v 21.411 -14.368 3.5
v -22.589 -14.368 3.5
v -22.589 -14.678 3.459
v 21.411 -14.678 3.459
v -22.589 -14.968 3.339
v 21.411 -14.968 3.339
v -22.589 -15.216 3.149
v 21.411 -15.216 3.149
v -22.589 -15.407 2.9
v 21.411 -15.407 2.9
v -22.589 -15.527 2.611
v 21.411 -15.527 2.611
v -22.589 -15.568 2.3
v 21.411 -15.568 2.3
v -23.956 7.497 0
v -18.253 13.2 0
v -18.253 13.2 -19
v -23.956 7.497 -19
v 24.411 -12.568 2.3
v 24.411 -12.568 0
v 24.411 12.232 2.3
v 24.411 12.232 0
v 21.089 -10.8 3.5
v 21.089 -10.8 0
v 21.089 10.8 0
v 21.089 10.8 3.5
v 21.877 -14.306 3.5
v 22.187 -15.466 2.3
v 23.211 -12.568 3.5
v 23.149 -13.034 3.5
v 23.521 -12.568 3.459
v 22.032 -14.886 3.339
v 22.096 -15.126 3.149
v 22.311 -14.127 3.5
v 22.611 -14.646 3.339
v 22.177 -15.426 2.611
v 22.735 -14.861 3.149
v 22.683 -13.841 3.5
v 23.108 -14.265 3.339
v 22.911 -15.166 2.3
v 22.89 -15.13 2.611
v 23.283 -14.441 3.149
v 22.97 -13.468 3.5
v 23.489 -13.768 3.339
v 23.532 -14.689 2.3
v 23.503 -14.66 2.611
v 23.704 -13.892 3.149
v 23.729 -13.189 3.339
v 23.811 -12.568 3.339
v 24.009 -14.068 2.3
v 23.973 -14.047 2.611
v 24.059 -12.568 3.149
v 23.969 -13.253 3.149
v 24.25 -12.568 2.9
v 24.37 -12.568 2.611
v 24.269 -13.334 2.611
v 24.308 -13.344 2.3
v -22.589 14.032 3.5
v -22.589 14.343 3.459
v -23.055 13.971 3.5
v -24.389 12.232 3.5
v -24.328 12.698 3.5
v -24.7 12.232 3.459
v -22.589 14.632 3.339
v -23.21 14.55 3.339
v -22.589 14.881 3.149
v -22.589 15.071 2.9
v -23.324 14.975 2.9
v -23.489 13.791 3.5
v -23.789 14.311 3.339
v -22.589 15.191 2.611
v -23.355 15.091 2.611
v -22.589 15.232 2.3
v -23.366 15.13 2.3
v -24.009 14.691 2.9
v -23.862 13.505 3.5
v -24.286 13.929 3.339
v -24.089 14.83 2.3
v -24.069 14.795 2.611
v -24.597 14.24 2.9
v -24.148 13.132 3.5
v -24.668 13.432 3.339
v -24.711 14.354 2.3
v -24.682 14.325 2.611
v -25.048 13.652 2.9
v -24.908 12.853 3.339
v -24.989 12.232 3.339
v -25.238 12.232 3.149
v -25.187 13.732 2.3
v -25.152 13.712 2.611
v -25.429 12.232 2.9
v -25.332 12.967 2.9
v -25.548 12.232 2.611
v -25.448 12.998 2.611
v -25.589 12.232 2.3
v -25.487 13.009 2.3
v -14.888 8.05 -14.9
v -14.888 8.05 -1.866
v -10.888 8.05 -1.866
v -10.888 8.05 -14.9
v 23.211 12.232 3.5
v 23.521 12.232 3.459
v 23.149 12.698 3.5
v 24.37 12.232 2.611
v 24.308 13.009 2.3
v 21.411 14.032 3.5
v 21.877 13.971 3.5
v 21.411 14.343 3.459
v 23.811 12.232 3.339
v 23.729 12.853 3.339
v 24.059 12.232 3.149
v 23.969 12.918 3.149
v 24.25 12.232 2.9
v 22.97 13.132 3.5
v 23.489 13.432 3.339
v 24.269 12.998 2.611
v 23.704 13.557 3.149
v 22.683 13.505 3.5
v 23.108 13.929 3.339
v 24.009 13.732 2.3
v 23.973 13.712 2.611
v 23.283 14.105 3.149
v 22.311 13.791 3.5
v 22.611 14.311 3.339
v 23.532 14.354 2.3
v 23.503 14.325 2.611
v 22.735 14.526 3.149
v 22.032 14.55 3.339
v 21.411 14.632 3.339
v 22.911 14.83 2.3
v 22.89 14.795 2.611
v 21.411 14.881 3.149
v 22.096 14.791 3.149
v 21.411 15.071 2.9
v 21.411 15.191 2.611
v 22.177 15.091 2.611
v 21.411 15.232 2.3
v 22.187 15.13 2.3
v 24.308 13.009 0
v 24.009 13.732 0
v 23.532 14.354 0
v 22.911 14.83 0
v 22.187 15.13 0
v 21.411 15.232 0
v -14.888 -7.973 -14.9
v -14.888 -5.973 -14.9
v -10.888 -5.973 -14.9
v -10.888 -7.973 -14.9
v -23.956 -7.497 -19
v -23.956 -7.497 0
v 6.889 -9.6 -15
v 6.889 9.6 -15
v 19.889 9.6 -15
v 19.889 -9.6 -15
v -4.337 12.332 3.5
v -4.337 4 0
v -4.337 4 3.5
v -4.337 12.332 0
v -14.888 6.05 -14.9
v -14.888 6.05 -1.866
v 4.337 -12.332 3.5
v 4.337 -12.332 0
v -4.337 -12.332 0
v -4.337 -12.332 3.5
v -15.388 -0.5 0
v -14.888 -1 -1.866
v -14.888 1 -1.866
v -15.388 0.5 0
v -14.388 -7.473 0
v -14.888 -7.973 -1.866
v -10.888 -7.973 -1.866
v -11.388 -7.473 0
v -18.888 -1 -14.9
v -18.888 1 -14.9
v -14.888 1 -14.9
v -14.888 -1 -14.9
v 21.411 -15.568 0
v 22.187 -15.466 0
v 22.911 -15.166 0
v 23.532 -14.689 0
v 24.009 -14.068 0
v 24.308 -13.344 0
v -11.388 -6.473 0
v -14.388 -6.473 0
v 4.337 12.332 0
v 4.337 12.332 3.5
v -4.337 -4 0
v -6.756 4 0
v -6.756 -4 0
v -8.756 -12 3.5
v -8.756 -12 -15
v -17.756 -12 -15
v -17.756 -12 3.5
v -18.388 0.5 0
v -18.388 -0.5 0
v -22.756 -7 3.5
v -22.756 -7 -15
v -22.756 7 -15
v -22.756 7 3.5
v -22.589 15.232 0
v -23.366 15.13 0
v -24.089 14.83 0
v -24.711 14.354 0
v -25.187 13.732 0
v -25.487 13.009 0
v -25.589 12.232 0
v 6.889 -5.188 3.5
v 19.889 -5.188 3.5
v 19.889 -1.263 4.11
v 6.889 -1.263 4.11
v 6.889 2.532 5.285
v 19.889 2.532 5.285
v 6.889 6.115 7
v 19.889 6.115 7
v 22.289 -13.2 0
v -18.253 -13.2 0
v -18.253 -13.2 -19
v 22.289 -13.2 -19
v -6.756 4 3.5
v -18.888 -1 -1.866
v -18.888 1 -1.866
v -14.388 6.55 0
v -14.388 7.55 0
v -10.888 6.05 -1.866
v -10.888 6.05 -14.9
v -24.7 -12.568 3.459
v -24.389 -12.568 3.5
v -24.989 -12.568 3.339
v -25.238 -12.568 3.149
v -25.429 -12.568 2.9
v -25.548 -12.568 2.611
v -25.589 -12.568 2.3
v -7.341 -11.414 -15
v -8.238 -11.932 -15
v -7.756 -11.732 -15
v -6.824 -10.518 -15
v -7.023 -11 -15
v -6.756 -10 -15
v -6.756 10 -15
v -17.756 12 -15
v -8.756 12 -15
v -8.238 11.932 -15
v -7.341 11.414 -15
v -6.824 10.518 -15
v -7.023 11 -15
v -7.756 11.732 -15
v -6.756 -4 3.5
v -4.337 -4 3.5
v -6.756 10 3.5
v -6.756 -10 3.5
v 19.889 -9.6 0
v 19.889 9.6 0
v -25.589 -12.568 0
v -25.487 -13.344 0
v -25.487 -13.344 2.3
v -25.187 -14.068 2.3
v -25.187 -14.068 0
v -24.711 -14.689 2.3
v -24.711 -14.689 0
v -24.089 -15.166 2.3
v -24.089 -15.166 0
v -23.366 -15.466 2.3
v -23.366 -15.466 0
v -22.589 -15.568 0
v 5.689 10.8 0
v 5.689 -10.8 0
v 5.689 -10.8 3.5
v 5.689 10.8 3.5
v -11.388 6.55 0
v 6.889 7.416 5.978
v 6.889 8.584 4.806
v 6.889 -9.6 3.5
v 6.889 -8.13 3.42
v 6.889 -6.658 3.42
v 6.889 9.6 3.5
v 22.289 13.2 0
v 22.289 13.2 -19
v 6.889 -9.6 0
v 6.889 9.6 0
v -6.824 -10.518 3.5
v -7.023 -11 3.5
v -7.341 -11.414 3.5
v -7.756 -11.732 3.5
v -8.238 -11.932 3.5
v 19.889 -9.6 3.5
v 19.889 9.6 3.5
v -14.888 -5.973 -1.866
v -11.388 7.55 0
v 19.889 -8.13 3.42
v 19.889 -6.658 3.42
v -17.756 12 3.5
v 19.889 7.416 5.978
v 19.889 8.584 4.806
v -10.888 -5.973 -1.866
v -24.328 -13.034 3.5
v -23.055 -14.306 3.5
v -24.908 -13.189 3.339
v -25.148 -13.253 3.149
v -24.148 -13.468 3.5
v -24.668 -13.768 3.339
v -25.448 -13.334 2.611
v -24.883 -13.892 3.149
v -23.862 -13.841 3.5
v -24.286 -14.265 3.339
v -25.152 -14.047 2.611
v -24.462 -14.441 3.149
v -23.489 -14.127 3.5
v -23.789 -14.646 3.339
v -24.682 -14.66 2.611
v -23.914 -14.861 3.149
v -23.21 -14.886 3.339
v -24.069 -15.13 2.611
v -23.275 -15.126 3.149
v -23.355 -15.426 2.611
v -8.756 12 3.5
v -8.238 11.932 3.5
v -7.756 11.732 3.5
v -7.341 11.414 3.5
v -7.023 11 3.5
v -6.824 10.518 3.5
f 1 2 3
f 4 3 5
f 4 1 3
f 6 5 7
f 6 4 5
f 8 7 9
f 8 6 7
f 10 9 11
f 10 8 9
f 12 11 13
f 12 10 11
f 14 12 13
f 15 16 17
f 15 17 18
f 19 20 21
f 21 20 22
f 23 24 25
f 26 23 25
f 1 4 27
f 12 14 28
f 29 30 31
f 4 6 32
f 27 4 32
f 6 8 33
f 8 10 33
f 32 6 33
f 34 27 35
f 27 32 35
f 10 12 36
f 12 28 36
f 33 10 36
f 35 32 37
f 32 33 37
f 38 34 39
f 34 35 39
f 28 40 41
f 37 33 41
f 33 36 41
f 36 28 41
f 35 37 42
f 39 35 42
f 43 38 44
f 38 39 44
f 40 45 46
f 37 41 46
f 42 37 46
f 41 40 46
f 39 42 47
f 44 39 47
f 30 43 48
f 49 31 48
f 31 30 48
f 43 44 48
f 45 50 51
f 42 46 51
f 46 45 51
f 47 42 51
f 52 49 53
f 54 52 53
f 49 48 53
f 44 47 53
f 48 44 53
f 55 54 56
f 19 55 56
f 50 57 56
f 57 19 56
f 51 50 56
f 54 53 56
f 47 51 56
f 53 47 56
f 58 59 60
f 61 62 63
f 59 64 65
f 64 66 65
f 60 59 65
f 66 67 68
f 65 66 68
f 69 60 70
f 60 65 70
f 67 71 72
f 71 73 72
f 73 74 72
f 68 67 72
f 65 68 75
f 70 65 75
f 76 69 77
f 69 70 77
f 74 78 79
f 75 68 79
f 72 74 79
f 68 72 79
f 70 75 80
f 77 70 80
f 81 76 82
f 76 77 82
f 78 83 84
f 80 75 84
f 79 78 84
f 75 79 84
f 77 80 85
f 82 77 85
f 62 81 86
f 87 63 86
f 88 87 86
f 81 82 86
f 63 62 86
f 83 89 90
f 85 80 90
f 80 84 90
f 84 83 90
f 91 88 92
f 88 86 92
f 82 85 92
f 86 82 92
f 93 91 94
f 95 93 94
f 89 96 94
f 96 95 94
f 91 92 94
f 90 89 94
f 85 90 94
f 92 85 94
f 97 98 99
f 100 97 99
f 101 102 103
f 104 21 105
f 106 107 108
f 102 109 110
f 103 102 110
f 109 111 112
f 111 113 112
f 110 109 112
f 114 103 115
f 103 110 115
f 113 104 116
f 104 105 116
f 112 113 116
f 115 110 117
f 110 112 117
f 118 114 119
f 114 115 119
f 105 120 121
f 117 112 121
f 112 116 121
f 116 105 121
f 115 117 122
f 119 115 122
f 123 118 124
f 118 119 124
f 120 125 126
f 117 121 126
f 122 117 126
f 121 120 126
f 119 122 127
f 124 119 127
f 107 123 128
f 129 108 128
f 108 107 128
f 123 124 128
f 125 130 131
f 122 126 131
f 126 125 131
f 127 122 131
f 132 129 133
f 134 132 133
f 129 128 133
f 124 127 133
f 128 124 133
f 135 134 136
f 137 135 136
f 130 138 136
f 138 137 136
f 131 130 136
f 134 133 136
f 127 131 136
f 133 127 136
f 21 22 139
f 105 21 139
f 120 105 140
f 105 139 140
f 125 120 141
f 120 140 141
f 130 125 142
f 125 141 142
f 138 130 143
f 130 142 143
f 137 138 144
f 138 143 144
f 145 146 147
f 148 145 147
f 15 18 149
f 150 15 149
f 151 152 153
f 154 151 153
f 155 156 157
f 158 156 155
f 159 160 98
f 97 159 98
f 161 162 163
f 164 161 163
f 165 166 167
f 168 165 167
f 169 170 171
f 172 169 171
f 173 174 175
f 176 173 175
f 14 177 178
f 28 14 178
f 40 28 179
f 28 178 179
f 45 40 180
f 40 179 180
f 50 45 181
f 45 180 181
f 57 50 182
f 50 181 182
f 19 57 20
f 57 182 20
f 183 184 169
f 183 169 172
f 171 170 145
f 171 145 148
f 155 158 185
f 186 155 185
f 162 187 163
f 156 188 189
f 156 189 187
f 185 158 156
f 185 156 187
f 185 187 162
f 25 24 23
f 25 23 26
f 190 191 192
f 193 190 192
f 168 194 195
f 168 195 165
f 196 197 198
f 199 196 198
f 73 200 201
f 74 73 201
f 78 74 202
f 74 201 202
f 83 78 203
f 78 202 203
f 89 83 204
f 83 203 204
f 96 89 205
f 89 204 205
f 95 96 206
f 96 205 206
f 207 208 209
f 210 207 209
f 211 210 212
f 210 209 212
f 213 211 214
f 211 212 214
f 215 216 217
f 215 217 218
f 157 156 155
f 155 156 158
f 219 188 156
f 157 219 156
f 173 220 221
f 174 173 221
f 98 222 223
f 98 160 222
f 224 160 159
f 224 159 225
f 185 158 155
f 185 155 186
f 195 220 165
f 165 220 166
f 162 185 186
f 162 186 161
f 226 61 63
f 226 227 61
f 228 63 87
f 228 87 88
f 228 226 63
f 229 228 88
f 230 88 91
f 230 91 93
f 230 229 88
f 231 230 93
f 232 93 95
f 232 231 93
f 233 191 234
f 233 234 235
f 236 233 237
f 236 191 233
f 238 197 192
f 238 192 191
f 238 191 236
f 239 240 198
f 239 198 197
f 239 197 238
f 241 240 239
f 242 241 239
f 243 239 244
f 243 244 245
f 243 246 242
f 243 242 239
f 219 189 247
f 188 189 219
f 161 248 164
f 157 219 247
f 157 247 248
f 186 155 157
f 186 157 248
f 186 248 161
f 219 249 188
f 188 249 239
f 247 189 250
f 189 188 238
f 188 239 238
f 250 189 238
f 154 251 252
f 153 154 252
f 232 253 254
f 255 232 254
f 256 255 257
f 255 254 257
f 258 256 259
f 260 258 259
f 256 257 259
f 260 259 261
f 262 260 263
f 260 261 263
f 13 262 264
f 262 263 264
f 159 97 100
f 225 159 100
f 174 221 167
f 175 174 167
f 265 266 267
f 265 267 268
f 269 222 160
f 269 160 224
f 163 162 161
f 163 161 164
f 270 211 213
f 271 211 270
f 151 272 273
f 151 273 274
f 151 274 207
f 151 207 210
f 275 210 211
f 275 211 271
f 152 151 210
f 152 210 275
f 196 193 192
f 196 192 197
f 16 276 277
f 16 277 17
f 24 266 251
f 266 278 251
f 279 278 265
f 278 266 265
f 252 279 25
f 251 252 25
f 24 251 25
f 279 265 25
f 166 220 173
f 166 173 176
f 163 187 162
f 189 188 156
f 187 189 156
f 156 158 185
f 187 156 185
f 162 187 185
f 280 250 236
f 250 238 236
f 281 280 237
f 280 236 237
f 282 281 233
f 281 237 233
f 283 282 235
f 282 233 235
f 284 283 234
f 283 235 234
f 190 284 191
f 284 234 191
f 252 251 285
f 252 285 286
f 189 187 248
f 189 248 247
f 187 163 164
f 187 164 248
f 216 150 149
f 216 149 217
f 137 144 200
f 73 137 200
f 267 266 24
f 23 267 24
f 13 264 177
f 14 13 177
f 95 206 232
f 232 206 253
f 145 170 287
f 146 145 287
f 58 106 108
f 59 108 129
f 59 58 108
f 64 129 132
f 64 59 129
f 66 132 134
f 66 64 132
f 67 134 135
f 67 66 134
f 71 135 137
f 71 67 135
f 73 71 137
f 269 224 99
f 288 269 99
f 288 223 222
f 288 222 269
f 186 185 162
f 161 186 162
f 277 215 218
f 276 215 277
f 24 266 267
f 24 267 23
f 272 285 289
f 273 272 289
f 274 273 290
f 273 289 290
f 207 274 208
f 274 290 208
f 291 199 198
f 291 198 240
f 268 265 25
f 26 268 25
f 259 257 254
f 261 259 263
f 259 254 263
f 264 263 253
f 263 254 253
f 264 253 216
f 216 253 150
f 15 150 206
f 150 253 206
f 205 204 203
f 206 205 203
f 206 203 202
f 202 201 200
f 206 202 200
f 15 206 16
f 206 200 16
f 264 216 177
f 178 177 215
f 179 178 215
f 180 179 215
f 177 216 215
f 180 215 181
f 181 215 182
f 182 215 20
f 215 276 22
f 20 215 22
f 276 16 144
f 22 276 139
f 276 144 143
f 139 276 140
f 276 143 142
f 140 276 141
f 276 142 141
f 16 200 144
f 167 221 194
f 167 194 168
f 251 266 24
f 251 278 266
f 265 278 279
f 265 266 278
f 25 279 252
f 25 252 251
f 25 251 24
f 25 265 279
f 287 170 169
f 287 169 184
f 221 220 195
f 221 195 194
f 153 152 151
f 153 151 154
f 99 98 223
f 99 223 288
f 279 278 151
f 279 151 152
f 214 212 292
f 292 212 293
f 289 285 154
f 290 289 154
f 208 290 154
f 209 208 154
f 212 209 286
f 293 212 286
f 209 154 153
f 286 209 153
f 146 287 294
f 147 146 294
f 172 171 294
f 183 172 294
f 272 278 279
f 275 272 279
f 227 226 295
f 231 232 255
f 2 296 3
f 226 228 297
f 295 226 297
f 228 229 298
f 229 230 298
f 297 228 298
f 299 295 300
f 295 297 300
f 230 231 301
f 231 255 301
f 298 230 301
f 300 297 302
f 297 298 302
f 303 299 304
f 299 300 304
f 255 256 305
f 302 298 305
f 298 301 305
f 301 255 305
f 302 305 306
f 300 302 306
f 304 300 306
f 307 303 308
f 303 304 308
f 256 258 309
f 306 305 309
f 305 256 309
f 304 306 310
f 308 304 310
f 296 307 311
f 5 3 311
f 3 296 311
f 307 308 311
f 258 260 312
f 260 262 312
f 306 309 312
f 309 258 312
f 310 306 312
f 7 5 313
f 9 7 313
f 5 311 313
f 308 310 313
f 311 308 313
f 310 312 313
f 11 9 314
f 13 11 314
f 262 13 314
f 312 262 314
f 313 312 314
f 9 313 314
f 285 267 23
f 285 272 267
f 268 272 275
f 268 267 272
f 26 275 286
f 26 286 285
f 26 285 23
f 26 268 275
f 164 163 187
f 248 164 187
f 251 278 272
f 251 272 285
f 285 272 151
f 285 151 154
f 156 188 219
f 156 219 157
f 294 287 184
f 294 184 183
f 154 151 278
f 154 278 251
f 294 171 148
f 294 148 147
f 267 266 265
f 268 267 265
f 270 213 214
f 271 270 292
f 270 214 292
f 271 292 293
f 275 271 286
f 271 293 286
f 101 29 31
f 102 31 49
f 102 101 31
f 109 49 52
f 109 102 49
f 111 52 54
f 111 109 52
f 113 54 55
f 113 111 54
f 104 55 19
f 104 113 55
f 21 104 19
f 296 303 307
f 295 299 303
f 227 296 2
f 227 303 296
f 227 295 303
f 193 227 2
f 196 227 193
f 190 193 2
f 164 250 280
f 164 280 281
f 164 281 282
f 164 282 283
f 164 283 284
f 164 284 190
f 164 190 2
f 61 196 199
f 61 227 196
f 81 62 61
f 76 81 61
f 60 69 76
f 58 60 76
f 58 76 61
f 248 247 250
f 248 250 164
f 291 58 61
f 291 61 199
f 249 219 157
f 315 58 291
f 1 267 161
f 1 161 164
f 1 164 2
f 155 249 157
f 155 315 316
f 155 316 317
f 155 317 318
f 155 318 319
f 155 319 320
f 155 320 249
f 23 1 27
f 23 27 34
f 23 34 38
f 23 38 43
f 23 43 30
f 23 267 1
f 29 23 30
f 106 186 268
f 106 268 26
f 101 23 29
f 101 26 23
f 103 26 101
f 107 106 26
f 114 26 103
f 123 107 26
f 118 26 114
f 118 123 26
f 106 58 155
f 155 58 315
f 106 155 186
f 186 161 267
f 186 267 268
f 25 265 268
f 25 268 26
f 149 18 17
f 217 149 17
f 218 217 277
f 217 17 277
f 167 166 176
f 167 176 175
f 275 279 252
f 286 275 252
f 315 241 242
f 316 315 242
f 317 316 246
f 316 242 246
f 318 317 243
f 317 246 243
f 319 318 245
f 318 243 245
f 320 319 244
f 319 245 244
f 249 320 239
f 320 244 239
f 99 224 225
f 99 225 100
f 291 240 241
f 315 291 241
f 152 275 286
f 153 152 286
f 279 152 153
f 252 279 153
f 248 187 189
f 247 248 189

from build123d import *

# Parameters (mm, degrees)
F0_W        = 15.4
F0_H        = 21.6
F1_DEPTH    = 3.5
F0_W_2      = 4
F0_H_2      = 2
F0_W_3      = 13
F0_H_3      = 19.2
F0_W_4      = 2.418700546
F0_H_4      = 8
F2_DEPTH    = 19
F3_DEPTH    = 15
F4_C1_SIZE2 = 0.5
F4_C1_SIZE  = 1.8660254038
F4_C2_SIZE2 = 0.5
F4_C2_SIZE  = 1.8660254038
F4_C3_SIZE2 = 1.8660254038
F4_C3_SIZE  = 0.5
F4_C4_SIZE2 = 1.8660254038
F4_C4_SIZE  = 0.5
F5_SIZE2    = 1.8660254038
F5_SIZE     = 0.5
F6_SIZE2    = 1.8660254038
F6_SIZE     = 0.5
F7_DEPTH    = 3.5
F8_DEPTH    = 22
F10_DEPTH   = 25
F11_R       = 1.2
F12_START   = -14.9
F12_DEPTH   = 0.1


with BuildPart() as f1:
    # F0 (on Top) → F1 (new body)
    with BuildSketch(Plane.XY):
        with BuildLine():
            Line((21.4106866419, 15.232257545), (-22.5893133581, 15.232257545))
            ThreePointArc((-22.5893133581, 15.232257545), (-24.7106337016, 14.3535778886), (-25.5893133581, 12.232257545))
            Line((-25.5893133581, 12.232257545), (-25.5893133581, -12.567742455))
            ThreePointArc((-25.5893133581, -12.567742455), (-24.7106337016, -14.6890627986), (-22.5893133581, -15.567742455))
            Line((-22.5893133581, -15.567742455), (21.4106866419, -15.567742455))
            ThreePointArc((21.4106866419, -15.567742455), (23.5320069855, -14.6890627986), (24.4106866419, -12.567742455))
            Line((24.4106866419, -12.567742455), (24.4106866419, 12.232257545))
            ThreePointArc((24.4106866419, 12.232257545), (23.5320069855, 14.3535778886), (21.4106866419, 15.232257545))
        make_face()
        Polygon((-18.2525572471, 13.2), (-8.7555009723, 13.2), (22.2888856925, 13.2), (22.2888856925, -13.2), (-8.7555009723, -13.2), (-18.2525572471, -13.2), (-23.9555009723, -7.4970562748), (-23.9555009723, 7.4970562748), align=None, mode=Mode.SUBTRACT)
        Polygon((22.2888856925, 13.2), (-8.7555009723, 13.2), (-18.2525572471, 13.2), (-23.9555009723, 7.4970562748), (-23.9555009723, -7.4970562748), (-18.2525572471, -13.2), (-8.7555009723, -13.2), (22.2888856925, -13.2), align=None)
        with BuildLine():
            Line((-4.3368004262, 4), (-4.3368004262, 12.3322419822))
            Line((-4.3368004262, 12.3322419822), (4.3368004262, 12.3322419822))
            Line((4.3368004262, 12.3322419822), (4.3368004262, -12.3322419822))
            Line((4.3368004262, -12.3322419822), (-4.3368004262, -12.3322419822))
            Line((-4.3368004262, -12.3322419822), (-4.3368004262, -4))
            Line((-4.3368004262, -4), (-6.7555009723, -4))
            Line((-6.7555009723, -4), (-6.7555009723, -10))
            ThreePointArc((-6.7555009723, -10), (-7.3412874099, -11.4142135624), (-8.7555009723, -12))
            Line((-8.7555009723, -12), (-17.7555009723, -12))
            Line((-17.7555009723, -12), (-22.7555009723, -7))
            Line((-22.7555009723, -7), (-22.7555009723, 7))
            Line((-22.7555009723, 7), (-17.7555009723, 12))
            Line((-17.7555009723, 12), (-8.7555009723, 12))
            ThreePointArc((-8.7555009723, 12), (-7.3412874099, 11.4142135624), (-6.7555009723, 10))
            Line((-6.7555009723, 10), (-6.7555009723, 4))
            Line((-6.7555009723, 4), (-4.3368004262, 4))
        make_face(mode=Mode.SUBTRACT)
        with Locations((13.3888856925, 0)):
            Rectangle(F0_W, F0_H, mode=Mode.SUBTRACT)
    extrude(amount=F1_DEPTH)

    # F0 (on Top) → F2 (join)
    with BuildSketch(Plane.XY):
        Polygon((22.2888856925, 13.2), (-8.7555009723, 13.2), (-18.2525572471, 13.2), (-23.9555009723, 7.4970562748), (-23.9555009723, -7.4970562748), (-18.2525572471, -13.2), (-8.7555009723, -13.2), (22.2888856925, -13.2), align=None)
        with BuildLine():
            Line((-4.3368004262, 4), (-4.3368004262, 12.3322419822))
            Line((-4.3368004262, 12.3322419822), (4.3368004262, 12.3322419822))
            Line((4.3368004262, 12.3322419822), (4.3368004262, -12.3322419822))
            Line((4.3368004262, -12.3322419822), (-4.3368004262, -12.3322419822))
            Line((-4.3368004262, -12.3322419822), (-4.3368004262, -4))
            Line((-4.3368004262, -4), (-6.7555009723, -4))
            Line((-6.7555009723, -4), (-6.7555009723, -10))
            ThreePointArc((-6.7555009723, -10), (-7.3412874099, -11.4142135624), (-8.7555009723, -12))
            Line((-8.7555009723, -12), (-17.7555009723, -12))
            Line((-17.7555009723, -12), (-22.7555009723, -7))
            Line((-22.7555009723, -7), (-22.7555009723, 7))
            Line((-22.7555009723, 7), (-17.7555009723, 12))
            Line((-17.7555009723, 12), (-8.7555009723, 12))
            ThreePointArc((-8.7555009723, 12), (-7.3412874099, 11.4142135624), (-6.7555009723, 10))
            Line((-6.7555009723, 10), (-6.7555009723, 4))
            Line((-6.7555009723, 4), (-4.3368004262, 4))
        make_face(mode=Mode.SUBTRACT)
        with Locations((13.3888856925, 0)):
            Rectangle(F0_W, F0_H, mode=Mode.SUBTRACT)
        with BuildLine():
            Line((-6.7555009723, -4), (-6.7555009723, 4))
            Line((-6.7555009723, 4), (-6.7555009723, 10))
            ThreePointArc((-6.7555009723, 10), (-7.3412874099, 11.4142135624), (-8.7555009723, 12))
            Line((-8.7555009723, 12), (-17.7555009723, 12))
            Line((-17.7555009723, 12), (-22.7555009723, 7))
            Line((-22.7555009723, 7), (-22.7555009723, -7))
            Line((-22.7555009723, -7), (-17.7555009723, -12))
            Line((-17.7555009723, -12), (-8.7555009723, -12))
            ThreePointArc((-8.7555009723, -12), (-7.3412874099, -11.4142135624), (-6.7555009723, -10))
            Line((-6.7555009723, -10), (-6.7555009723, -4))
        make_face()
        with Locations((-12.8875139207, -6.9733052514)):
            Rectangle(F0_W_2, F0_H_2, mode=Mode.SUBTRACT)
        with Locations((-16.8875139207, 0)):
            Rectangle(F0_W_2, F0_H_2, mode=Mode.SUBTRACT)
        with Locations((-12.8875139207, 7.0500936662)):
            Rectangle(F0_W_2, F0_H_2, mode=Mode.SUBTRACT)
        with Locations((13.3888856925, 0)):
            Rectangle(F0_W, F0_H)
        with Locations((13.3888856925, 0)):
            Rectangle(F0_W_3, F0_H_3, mode=Mode.SUBTRACT)
        with Locations((13.3888856925, 0)):
            Rectangle(F0_W_3, F0_H_3)
        Polygon((4.3368004262, 12.3322419822), (-4.3368004262, 12.3322419822), (-4.3368004262, 4), (-4.3368004262, -4), (-4.3368004262, -12.3322419822), (4.3368004262, -12.3322419822), align=None)
        with Locations((-5.5461506993, 0)):
            Rectangle(F0_W_4, F0_H_4)
        with Locations((-12.8875139207, -6.9733052514)):
            Rectangle(F0_W_2, F0_H_2)
        with Locations((-16.8875139207, 0)):
            Rectangle(F0_W_2, F0_H_2)
        with Locations((-12.8875139207, 7.0500936662)):
            Rectangle(F0_W_2, F0_H_2)
    extrude(amount=-F2_DEPTH)

    # F0 (on Top) → F3 (cut)
    with BuildSketch(Plane.XY):
        with BuildLine():
            Line((-6.7555009723, -4), (-6.7555009723, 4))
            Line((-6.7555009723, 4), (-6.7555009723, 10))
            ThreePointArc((-6.7555009723, 10), (-7.3412874099, 11.4142135624), (-8.7555009723, 12))
            Line((-8.7555009723, 12), (-17.7555009723, 12))
            Line((-17.7555009723, 12), (-22.7555009723, 7))
            Line((-22.7555009723, 7), (-22.7555009723, -7))
            Line((-22.7555009723, -7), (-17.7555009723, -12))
            Line((-17.7555009723, -12), (-8.7555009723, -12))
            ThreePointArc((-8.7555009723, -12), (-7.3412874099, -11.4142135624), (-6.7555009723, -10))
            Line((-6.7555009723, -10), (-6.7555009723, -4))
        make_face()
        with Locations((-12.8875139207, -6.9733052514)):
            Rectangle(F0_W_2, F0_H_2, mode=Mode.SUBTRACT)
        with Locations((-16.8875139207, 0)):
            Rectangle(F0_W_2, F0_H_2, mode=Mode.SUBTRACT)
        with Locations((-12.8875139207, 7.0500936662)):
            Rectangle(F0_W_2, F0_H_2, mode=Mode.SUBTRACT)
        with Locations((13.3888856925, 0)):
            Rectangle(F0_W_3, F0_H_3)
    extrude(amount=-F3_DEPTH, mode=Mode.SUBTRACT)

    # F4: chamfer of 0.5 x 1.8660254038 on 4 edges, made by hand

    # F4_c1
    f4_c1_edges = [f1.edges().sort_by_distance(p)[0] for p in [
        (-10.8875139207, 7.0500936662, 0),
    ]]
    f4_c1_side = f1.faces().sort_by_distance((-10.8875139207, 7.0500936662, -0.01))[0]
    chamfer(f4_c1_edges, length=F4_C1_SIZE, length2=F4_C1_SIZE2, reference=f4_c1_side)

    # F4_c2
    f4_c2_edges = [f1.edges().sort_by_distance(p)[0] for p in [
        (-13.1375139207, 6.0500936662, 0),
    ]]
    f4_c2_side = f1.faces().sort_by_distance((-13.1375139207, 6.0500936662, -0.01))[0]
    chamfer(f4_c2_edges, length=F4_C2_SIZE, length2=F4_C2_SIZE2, reference=f4_c2_side)

    # F4_c3
    f4_c3_edges = [f1.edges().sort_by_distance(p)[0] for p in [
        (-14.8875139207, 7.3000936662, 0),
    ]]
    f4_c3_side = f1.faces().sort_by_distance((-14.8775139207, 7.3000936662, 0))[0]
    chamfer(f4_c3_edges, length=F4_C3_SIZE, length2=F4_C3_SIZE2, reference=f4_c3_side)

    # F4_c4
    f4_c4_edges = [f1.edges().sort_by_distance(p)[0] for p in [
        (-12.8875139207, 8.0500936662, 0),
    ]]
    f4_c4_side = f1.faces().sort_by_distance((-12.8875139207, 8.0400936662, 0))[0]
    chamfer(f4_c4_edges, length=F4_C4_SIZE, length2=F4_C4_SIZE2, reference=f4_c4_side)

    # F5
    f5_edges = [f1.edges().sort_by_distance(p)[0] for p in [
        (-16.887514, 1, 0),
        (-14.887514, 0, 0),
        (-16.887514, -1, 0),
        (-18.887514, 0, 0),
    ]]
    f5_side = f1.faces().sort_by_distance((-16.887514, 0, 0))[0]
    chamfer(f5_edges, length=F5_SIZE, length2=F5_SIZE2, reference=f5_side)

    # F6
    f6_edges = [f1.edges().sort_by_distance(p)[0] for p in [
        (-14.887514, -6.973305, 0),
        (-12.887514, -5.973305, 0),
        (-10.887514, -6.973305, 0),
        (-12.887514, -7.973305, 0),
    ]]
    f6_side = f1.faces().sort_by_distance((-12.887514, -6.973305, 0))[0]
    chamfer(f6_edges, length=F6_SIZE, length2=F6_SIZE2, reference=f6_side)


with BuildPart() as f7:
    # F7 (new, through all): a face of the model
    f7_faces = [f1.part.faces().sort_by_distance(p)[0] for p in [
        (-0.4600310991, 0, 0),
    ]]
    extrude(f7_faces, amount=F7_DEPTH)


with BuildPart() as f7b:
    # F7#2 (new, through all): a face of the model
    f7_2_faces = [f1.part.faces().sort_by_distance(p)[0] for p in [
        (13.3888856925, -10.5347227865, 0),
    ]]
    extrude(f7_2_faces, amount=F7_DEPTH)


with BuildPart() as f8:
    # F8 (new): a face of the model
    f8_faces = [f1.part.faces().sort_by_distance(p)[0] for p in [
        (13.3888856925, 0, -15),
    ]]
    extrude(f8_faces, amount=F8_DEPTH)

    # F9 (on face) → F10 (cut)
    with BuildSketch(Plane.YZ.offset(19.8888856925)):
        with BuildLine():
            ThreePointArc((-9.6, 3.5), (-7.3938840069, 3.410434439), (-5.1877680138, 3.5))
            Line((-5.1877680138, 3.5), (-9.6, 3.5))
        make_face()
        with BuildLine():
            Line((-9.6, 3.5), (-5.1877680138, 3.5))
            ThreePointArc((-5.1877680138, 3.5), (0.6561669902, 4.6282852574), (6.1150655176, 7))
            Line((6.1150655176, 7), (-9.6, 7))
            Line((-9.6, 7), (-9.6, 3.5))
        make_face()
        with BuildLine():
            ThreePointArc((6.1150655176, 7), (8.0179372576, 5.4097140483), (9.6, 3.5))
            Line((9.6, 3.5), (9.6, 7))
            Line((9.6, 7), (6.1150655176, 7))
        make_face()
    extrude(amount=-F10_DEPTH, mode=Mode.SUBTRACT)


with BuildPart() as f1_1:
    add(f1.part)

    # F11
    f11_edges = [f1_1.edges().sort_by_distance(p)[0] for p in [
        (-25.589313, -0.167742, 3.5),
        (24.410687, -0.167742, 3.5),
        (23.532007, 14.353578, 3.5),
        (-0.589313, 15.232258, 3.5),
        (-24.710634, 14.353578, 3.5),
        (-24.710634, -14.689063, 3.5),
        (-0.589313, -15.567742, 3.5),
        (23.532007, -14.689063, 3.5),
    ]]
    fillet(f11_edges, radius=F11_R)

    # F0 (on Top) → F12 (cut)
    with BuildSketch(Plane.XY.offset(F12_START)):
        with Locations((-12.8875139207, 7.0500936662)):
            Rectangle(F0_W_2, F0_H_2)
        with Locations((-16.8875139207, 0)):
            Rectangle(F0_W_2, F0_H_2)
        with Locations((-12.8875139207, -6.9733052514)):
            Rectangle(F0_W_2, F0_H_2)
    extrude(amount=-F12_DEPTH, mode=Mode.SUBTRACT)


solid = Compound([f7.part, f7b.part, f8.part, f1_1.part])
